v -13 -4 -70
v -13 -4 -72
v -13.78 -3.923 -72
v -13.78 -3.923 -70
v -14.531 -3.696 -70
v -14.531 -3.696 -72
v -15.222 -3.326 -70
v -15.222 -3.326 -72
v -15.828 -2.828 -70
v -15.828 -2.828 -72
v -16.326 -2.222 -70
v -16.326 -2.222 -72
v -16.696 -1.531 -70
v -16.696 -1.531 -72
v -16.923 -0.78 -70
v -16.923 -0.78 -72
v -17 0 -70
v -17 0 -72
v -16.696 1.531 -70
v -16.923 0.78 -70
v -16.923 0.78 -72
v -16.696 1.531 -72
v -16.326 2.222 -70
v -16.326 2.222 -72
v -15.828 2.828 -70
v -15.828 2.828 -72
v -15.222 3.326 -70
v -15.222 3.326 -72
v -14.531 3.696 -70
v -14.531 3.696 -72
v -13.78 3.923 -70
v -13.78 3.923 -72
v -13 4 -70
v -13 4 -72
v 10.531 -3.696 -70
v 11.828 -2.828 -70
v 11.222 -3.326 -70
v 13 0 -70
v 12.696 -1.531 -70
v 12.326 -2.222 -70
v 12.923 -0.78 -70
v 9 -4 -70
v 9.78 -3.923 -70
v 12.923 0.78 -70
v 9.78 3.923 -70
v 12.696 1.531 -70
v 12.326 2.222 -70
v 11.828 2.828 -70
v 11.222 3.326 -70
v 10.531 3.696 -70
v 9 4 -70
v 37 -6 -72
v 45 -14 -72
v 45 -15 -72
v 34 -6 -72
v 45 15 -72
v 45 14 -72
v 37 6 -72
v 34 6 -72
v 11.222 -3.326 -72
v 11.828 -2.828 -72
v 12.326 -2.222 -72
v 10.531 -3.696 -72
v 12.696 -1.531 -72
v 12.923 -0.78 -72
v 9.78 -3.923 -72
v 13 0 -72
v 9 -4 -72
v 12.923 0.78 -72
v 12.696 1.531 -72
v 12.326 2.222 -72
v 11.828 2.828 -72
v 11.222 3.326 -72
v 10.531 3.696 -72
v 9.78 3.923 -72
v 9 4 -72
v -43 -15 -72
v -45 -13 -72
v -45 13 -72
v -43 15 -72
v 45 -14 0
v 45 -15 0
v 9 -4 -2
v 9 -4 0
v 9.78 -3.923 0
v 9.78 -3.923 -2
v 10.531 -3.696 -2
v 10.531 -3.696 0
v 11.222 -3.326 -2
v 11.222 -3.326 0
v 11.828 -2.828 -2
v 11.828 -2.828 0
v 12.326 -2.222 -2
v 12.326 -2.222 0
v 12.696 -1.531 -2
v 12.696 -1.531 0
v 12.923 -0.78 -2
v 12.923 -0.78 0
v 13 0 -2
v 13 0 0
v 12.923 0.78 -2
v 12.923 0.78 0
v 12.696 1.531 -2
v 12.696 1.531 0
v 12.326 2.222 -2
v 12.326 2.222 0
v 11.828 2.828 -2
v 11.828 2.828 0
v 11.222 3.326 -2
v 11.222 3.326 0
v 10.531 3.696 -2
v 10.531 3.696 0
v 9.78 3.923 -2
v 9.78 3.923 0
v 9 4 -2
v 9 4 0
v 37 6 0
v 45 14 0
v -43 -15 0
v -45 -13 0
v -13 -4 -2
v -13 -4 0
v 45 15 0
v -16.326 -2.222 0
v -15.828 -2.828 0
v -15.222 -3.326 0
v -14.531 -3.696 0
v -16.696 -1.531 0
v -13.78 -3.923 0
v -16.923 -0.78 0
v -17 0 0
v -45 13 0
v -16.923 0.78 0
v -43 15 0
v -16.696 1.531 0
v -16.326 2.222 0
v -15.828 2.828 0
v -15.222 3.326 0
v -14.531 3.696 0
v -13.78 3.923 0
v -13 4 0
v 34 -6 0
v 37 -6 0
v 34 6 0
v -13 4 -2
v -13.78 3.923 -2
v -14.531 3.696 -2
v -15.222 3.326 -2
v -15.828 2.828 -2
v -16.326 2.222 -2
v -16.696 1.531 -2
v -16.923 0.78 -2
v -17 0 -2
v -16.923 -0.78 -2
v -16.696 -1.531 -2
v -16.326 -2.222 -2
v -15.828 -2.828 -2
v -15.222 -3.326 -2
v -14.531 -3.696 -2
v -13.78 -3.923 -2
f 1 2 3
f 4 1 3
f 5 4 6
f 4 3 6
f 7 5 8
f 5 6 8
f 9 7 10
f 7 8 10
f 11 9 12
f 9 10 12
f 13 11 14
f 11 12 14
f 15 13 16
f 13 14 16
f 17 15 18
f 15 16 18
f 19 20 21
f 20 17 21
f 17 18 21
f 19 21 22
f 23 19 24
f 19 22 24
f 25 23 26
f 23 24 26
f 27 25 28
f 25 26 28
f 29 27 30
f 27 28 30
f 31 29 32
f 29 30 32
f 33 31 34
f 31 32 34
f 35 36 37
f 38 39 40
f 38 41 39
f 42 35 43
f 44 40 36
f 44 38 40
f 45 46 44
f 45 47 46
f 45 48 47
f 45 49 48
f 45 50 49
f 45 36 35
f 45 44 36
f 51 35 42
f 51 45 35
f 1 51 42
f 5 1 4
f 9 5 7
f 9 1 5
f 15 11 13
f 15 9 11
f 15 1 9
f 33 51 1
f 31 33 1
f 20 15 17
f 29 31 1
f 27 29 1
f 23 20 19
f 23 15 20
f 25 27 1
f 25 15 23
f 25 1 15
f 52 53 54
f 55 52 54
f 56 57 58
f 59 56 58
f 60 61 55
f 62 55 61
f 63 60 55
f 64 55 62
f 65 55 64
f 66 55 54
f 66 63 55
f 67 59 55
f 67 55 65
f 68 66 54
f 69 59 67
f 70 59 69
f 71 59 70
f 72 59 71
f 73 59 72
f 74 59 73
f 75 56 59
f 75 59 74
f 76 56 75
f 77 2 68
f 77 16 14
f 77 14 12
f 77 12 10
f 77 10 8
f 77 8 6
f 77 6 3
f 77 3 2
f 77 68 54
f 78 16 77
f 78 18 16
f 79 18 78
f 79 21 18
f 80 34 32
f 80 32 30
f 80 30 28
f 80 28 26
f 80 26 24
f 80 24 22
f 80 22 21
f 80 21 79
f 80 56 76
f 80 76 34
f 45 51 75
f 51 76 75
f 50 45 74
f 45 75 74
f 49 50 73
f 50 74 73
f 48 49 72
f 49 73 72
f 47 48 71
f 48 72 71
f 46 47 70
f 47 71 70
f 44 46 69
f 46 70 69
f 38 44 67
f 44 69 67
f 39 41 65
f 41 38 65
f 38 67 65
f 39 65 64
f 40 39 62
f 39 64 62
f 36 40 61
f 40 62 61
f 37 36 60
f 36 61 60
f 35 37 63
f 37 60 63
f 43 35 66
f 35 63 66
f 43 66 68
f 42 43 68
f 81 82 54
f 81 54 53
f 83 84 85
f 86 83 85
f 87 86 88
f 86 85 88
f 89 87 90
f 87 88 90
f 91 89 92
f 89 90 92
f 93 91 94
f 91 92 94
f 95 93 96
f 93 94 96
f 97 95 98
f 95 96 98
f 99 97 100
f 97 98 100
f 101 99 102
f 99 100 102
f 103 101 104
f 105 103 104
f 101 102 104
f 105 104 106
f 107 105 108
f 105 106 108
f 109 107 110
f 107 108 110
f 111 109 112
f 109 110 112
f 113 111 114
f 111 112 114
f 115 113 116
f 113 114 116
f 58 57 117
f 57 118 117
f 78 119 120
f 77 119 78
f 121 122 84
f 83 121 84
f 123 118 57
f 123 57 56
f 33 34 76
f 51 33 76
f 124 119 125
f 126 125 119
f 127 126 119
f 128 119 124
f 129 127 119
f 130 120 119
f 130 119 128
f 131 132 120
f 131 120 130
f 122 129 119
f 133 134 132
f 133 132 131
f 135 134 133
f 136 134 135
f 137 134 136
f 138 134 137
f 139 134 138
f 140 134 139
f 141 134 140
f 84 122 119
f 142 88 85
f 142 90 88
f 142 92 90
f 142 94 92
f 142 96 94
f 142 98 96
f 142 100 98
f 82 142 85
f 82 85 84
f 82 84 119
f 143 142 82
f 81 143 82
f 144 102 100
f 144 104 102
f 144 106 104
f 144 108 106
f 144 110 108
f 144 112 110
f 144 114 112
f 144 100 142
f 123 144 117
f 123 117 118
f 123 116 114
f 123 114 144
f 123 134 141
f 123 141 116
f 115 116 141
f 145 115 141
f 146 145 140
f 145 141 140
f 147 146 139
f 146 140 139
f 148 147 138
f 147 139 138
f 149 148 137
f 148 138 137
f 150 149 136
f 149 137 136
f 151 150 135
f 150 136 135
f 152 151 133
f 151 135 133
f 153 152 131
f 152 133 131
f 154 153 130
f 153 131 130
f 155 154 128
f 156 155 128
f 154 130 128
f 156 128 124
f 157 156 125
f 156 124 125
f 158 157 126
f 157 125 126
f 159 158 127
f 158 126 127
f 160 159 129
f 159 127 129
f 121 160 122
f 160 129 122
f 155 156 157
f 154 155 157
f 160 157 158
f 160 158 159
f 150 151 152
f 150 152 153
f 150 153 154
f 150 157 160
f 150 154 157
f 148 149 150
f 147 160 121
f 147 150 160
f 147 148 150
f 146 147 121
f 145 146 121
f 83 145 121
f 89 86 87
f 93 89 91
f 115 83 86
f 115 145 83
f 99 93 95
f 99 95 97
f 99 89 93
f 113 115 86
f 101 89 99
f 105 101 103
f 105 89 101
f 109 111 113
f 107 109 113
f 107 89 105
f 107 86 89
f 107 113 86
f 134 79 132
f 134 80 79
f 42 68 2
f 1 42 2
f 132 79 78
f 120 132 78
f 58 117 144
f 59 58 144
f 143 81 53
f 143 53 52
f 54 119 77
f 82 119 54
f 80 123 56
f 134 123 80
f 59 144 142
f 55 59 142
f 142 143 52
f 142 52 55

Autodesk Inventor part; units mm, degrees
ref_plane "YZ Plane" through (0, 0, 0) normal (1, 0, 0) x (0, 1, 0)
ref_plane "XZ Plane" through (0, 0, 0) normal (0, 1, 0) x (-1, 0, 0)
ref_plane "XY Plane" through (0, 0, 0) normal (0, 0, 1) x (1, 0, 0)
sketch "Эскиз1" plane through (0, 0, 0) normal (0, 0, 1) x (1, 0, 0)
  line L0 (-45, -15) -> (45, -15)
  line L1 (45, 15) -> (-45, 15)
  line L2 (-45, 15) -> (-45, -15)
  line L3 (-45, -15) -> (45, 15) construction
  line L4 (45, -15) -> (-45, 15) construction
  line L5 (45, 14) -> (37, 6)
  line L6 (37, 6) -> (34, 6)
  line L7 (34, 6) -> (34, 0)
  line L8 (34, 0) -> (45, 0) construction
  line L9 (45, -14) -> (37, -6)
  line L10 (37, -6) -> (34, -6)
  line L11 (34, -6) -> (34, 0)
  line L12 (-13, 0) -> (9, 0) construction
  line L13 (-13, -4) -> (9, -4)
  line L14 (9, 4) -> (-13, 4)
  arc A0 (-13, 4) -> (-13, -4) centre (-13, 0) ccw
  arc A1 (9, -4) -> (9, 4) centre (9, 0) ccw
  line L15 (45, -15) -> (45, -14)
  line L16 (45, 14) -> (45, 15)
  circle A2 centre (51.5061, 0) radius 14.5 construction
  point P0 (0, 0)
  point P1 (0, 0)
  point P2 (-2, 0)
  point P3 (0, 0)
  dimension "d0" = 90
  dimension "d1" = 28
  dimension "d2" = 12
  dimension "d3" = 30
  dimension "d4" = 90
  dimension "d5" = 4
  dimension "d6" = 22
  dimension "d7" = 36
  dimension "d9" = 11
  dimension "d17" = 29
  dimension "d18" = 6.5061
extrude "Выдавливание1" add sketch "Эскиз1" against normal blind 36 contours L2 L1 L16 L5 L6 L7 L11 L10 L9 L15 L0 | A0 L14 A1 L13
extrude "Выдавливание2" cut sketch "Эскиз1" against normal blind 2 contours A0 L14 A1 L13
mirror "Зеркальное отражение1" about plane through (1.1429, 0, -36) normal (0, 0, -1)
chamfer "Фаска1" distance 2 angle 45 2 edges at (-45, 15, -36) (-45, -15, -36)
properties part number "Призма 5"
